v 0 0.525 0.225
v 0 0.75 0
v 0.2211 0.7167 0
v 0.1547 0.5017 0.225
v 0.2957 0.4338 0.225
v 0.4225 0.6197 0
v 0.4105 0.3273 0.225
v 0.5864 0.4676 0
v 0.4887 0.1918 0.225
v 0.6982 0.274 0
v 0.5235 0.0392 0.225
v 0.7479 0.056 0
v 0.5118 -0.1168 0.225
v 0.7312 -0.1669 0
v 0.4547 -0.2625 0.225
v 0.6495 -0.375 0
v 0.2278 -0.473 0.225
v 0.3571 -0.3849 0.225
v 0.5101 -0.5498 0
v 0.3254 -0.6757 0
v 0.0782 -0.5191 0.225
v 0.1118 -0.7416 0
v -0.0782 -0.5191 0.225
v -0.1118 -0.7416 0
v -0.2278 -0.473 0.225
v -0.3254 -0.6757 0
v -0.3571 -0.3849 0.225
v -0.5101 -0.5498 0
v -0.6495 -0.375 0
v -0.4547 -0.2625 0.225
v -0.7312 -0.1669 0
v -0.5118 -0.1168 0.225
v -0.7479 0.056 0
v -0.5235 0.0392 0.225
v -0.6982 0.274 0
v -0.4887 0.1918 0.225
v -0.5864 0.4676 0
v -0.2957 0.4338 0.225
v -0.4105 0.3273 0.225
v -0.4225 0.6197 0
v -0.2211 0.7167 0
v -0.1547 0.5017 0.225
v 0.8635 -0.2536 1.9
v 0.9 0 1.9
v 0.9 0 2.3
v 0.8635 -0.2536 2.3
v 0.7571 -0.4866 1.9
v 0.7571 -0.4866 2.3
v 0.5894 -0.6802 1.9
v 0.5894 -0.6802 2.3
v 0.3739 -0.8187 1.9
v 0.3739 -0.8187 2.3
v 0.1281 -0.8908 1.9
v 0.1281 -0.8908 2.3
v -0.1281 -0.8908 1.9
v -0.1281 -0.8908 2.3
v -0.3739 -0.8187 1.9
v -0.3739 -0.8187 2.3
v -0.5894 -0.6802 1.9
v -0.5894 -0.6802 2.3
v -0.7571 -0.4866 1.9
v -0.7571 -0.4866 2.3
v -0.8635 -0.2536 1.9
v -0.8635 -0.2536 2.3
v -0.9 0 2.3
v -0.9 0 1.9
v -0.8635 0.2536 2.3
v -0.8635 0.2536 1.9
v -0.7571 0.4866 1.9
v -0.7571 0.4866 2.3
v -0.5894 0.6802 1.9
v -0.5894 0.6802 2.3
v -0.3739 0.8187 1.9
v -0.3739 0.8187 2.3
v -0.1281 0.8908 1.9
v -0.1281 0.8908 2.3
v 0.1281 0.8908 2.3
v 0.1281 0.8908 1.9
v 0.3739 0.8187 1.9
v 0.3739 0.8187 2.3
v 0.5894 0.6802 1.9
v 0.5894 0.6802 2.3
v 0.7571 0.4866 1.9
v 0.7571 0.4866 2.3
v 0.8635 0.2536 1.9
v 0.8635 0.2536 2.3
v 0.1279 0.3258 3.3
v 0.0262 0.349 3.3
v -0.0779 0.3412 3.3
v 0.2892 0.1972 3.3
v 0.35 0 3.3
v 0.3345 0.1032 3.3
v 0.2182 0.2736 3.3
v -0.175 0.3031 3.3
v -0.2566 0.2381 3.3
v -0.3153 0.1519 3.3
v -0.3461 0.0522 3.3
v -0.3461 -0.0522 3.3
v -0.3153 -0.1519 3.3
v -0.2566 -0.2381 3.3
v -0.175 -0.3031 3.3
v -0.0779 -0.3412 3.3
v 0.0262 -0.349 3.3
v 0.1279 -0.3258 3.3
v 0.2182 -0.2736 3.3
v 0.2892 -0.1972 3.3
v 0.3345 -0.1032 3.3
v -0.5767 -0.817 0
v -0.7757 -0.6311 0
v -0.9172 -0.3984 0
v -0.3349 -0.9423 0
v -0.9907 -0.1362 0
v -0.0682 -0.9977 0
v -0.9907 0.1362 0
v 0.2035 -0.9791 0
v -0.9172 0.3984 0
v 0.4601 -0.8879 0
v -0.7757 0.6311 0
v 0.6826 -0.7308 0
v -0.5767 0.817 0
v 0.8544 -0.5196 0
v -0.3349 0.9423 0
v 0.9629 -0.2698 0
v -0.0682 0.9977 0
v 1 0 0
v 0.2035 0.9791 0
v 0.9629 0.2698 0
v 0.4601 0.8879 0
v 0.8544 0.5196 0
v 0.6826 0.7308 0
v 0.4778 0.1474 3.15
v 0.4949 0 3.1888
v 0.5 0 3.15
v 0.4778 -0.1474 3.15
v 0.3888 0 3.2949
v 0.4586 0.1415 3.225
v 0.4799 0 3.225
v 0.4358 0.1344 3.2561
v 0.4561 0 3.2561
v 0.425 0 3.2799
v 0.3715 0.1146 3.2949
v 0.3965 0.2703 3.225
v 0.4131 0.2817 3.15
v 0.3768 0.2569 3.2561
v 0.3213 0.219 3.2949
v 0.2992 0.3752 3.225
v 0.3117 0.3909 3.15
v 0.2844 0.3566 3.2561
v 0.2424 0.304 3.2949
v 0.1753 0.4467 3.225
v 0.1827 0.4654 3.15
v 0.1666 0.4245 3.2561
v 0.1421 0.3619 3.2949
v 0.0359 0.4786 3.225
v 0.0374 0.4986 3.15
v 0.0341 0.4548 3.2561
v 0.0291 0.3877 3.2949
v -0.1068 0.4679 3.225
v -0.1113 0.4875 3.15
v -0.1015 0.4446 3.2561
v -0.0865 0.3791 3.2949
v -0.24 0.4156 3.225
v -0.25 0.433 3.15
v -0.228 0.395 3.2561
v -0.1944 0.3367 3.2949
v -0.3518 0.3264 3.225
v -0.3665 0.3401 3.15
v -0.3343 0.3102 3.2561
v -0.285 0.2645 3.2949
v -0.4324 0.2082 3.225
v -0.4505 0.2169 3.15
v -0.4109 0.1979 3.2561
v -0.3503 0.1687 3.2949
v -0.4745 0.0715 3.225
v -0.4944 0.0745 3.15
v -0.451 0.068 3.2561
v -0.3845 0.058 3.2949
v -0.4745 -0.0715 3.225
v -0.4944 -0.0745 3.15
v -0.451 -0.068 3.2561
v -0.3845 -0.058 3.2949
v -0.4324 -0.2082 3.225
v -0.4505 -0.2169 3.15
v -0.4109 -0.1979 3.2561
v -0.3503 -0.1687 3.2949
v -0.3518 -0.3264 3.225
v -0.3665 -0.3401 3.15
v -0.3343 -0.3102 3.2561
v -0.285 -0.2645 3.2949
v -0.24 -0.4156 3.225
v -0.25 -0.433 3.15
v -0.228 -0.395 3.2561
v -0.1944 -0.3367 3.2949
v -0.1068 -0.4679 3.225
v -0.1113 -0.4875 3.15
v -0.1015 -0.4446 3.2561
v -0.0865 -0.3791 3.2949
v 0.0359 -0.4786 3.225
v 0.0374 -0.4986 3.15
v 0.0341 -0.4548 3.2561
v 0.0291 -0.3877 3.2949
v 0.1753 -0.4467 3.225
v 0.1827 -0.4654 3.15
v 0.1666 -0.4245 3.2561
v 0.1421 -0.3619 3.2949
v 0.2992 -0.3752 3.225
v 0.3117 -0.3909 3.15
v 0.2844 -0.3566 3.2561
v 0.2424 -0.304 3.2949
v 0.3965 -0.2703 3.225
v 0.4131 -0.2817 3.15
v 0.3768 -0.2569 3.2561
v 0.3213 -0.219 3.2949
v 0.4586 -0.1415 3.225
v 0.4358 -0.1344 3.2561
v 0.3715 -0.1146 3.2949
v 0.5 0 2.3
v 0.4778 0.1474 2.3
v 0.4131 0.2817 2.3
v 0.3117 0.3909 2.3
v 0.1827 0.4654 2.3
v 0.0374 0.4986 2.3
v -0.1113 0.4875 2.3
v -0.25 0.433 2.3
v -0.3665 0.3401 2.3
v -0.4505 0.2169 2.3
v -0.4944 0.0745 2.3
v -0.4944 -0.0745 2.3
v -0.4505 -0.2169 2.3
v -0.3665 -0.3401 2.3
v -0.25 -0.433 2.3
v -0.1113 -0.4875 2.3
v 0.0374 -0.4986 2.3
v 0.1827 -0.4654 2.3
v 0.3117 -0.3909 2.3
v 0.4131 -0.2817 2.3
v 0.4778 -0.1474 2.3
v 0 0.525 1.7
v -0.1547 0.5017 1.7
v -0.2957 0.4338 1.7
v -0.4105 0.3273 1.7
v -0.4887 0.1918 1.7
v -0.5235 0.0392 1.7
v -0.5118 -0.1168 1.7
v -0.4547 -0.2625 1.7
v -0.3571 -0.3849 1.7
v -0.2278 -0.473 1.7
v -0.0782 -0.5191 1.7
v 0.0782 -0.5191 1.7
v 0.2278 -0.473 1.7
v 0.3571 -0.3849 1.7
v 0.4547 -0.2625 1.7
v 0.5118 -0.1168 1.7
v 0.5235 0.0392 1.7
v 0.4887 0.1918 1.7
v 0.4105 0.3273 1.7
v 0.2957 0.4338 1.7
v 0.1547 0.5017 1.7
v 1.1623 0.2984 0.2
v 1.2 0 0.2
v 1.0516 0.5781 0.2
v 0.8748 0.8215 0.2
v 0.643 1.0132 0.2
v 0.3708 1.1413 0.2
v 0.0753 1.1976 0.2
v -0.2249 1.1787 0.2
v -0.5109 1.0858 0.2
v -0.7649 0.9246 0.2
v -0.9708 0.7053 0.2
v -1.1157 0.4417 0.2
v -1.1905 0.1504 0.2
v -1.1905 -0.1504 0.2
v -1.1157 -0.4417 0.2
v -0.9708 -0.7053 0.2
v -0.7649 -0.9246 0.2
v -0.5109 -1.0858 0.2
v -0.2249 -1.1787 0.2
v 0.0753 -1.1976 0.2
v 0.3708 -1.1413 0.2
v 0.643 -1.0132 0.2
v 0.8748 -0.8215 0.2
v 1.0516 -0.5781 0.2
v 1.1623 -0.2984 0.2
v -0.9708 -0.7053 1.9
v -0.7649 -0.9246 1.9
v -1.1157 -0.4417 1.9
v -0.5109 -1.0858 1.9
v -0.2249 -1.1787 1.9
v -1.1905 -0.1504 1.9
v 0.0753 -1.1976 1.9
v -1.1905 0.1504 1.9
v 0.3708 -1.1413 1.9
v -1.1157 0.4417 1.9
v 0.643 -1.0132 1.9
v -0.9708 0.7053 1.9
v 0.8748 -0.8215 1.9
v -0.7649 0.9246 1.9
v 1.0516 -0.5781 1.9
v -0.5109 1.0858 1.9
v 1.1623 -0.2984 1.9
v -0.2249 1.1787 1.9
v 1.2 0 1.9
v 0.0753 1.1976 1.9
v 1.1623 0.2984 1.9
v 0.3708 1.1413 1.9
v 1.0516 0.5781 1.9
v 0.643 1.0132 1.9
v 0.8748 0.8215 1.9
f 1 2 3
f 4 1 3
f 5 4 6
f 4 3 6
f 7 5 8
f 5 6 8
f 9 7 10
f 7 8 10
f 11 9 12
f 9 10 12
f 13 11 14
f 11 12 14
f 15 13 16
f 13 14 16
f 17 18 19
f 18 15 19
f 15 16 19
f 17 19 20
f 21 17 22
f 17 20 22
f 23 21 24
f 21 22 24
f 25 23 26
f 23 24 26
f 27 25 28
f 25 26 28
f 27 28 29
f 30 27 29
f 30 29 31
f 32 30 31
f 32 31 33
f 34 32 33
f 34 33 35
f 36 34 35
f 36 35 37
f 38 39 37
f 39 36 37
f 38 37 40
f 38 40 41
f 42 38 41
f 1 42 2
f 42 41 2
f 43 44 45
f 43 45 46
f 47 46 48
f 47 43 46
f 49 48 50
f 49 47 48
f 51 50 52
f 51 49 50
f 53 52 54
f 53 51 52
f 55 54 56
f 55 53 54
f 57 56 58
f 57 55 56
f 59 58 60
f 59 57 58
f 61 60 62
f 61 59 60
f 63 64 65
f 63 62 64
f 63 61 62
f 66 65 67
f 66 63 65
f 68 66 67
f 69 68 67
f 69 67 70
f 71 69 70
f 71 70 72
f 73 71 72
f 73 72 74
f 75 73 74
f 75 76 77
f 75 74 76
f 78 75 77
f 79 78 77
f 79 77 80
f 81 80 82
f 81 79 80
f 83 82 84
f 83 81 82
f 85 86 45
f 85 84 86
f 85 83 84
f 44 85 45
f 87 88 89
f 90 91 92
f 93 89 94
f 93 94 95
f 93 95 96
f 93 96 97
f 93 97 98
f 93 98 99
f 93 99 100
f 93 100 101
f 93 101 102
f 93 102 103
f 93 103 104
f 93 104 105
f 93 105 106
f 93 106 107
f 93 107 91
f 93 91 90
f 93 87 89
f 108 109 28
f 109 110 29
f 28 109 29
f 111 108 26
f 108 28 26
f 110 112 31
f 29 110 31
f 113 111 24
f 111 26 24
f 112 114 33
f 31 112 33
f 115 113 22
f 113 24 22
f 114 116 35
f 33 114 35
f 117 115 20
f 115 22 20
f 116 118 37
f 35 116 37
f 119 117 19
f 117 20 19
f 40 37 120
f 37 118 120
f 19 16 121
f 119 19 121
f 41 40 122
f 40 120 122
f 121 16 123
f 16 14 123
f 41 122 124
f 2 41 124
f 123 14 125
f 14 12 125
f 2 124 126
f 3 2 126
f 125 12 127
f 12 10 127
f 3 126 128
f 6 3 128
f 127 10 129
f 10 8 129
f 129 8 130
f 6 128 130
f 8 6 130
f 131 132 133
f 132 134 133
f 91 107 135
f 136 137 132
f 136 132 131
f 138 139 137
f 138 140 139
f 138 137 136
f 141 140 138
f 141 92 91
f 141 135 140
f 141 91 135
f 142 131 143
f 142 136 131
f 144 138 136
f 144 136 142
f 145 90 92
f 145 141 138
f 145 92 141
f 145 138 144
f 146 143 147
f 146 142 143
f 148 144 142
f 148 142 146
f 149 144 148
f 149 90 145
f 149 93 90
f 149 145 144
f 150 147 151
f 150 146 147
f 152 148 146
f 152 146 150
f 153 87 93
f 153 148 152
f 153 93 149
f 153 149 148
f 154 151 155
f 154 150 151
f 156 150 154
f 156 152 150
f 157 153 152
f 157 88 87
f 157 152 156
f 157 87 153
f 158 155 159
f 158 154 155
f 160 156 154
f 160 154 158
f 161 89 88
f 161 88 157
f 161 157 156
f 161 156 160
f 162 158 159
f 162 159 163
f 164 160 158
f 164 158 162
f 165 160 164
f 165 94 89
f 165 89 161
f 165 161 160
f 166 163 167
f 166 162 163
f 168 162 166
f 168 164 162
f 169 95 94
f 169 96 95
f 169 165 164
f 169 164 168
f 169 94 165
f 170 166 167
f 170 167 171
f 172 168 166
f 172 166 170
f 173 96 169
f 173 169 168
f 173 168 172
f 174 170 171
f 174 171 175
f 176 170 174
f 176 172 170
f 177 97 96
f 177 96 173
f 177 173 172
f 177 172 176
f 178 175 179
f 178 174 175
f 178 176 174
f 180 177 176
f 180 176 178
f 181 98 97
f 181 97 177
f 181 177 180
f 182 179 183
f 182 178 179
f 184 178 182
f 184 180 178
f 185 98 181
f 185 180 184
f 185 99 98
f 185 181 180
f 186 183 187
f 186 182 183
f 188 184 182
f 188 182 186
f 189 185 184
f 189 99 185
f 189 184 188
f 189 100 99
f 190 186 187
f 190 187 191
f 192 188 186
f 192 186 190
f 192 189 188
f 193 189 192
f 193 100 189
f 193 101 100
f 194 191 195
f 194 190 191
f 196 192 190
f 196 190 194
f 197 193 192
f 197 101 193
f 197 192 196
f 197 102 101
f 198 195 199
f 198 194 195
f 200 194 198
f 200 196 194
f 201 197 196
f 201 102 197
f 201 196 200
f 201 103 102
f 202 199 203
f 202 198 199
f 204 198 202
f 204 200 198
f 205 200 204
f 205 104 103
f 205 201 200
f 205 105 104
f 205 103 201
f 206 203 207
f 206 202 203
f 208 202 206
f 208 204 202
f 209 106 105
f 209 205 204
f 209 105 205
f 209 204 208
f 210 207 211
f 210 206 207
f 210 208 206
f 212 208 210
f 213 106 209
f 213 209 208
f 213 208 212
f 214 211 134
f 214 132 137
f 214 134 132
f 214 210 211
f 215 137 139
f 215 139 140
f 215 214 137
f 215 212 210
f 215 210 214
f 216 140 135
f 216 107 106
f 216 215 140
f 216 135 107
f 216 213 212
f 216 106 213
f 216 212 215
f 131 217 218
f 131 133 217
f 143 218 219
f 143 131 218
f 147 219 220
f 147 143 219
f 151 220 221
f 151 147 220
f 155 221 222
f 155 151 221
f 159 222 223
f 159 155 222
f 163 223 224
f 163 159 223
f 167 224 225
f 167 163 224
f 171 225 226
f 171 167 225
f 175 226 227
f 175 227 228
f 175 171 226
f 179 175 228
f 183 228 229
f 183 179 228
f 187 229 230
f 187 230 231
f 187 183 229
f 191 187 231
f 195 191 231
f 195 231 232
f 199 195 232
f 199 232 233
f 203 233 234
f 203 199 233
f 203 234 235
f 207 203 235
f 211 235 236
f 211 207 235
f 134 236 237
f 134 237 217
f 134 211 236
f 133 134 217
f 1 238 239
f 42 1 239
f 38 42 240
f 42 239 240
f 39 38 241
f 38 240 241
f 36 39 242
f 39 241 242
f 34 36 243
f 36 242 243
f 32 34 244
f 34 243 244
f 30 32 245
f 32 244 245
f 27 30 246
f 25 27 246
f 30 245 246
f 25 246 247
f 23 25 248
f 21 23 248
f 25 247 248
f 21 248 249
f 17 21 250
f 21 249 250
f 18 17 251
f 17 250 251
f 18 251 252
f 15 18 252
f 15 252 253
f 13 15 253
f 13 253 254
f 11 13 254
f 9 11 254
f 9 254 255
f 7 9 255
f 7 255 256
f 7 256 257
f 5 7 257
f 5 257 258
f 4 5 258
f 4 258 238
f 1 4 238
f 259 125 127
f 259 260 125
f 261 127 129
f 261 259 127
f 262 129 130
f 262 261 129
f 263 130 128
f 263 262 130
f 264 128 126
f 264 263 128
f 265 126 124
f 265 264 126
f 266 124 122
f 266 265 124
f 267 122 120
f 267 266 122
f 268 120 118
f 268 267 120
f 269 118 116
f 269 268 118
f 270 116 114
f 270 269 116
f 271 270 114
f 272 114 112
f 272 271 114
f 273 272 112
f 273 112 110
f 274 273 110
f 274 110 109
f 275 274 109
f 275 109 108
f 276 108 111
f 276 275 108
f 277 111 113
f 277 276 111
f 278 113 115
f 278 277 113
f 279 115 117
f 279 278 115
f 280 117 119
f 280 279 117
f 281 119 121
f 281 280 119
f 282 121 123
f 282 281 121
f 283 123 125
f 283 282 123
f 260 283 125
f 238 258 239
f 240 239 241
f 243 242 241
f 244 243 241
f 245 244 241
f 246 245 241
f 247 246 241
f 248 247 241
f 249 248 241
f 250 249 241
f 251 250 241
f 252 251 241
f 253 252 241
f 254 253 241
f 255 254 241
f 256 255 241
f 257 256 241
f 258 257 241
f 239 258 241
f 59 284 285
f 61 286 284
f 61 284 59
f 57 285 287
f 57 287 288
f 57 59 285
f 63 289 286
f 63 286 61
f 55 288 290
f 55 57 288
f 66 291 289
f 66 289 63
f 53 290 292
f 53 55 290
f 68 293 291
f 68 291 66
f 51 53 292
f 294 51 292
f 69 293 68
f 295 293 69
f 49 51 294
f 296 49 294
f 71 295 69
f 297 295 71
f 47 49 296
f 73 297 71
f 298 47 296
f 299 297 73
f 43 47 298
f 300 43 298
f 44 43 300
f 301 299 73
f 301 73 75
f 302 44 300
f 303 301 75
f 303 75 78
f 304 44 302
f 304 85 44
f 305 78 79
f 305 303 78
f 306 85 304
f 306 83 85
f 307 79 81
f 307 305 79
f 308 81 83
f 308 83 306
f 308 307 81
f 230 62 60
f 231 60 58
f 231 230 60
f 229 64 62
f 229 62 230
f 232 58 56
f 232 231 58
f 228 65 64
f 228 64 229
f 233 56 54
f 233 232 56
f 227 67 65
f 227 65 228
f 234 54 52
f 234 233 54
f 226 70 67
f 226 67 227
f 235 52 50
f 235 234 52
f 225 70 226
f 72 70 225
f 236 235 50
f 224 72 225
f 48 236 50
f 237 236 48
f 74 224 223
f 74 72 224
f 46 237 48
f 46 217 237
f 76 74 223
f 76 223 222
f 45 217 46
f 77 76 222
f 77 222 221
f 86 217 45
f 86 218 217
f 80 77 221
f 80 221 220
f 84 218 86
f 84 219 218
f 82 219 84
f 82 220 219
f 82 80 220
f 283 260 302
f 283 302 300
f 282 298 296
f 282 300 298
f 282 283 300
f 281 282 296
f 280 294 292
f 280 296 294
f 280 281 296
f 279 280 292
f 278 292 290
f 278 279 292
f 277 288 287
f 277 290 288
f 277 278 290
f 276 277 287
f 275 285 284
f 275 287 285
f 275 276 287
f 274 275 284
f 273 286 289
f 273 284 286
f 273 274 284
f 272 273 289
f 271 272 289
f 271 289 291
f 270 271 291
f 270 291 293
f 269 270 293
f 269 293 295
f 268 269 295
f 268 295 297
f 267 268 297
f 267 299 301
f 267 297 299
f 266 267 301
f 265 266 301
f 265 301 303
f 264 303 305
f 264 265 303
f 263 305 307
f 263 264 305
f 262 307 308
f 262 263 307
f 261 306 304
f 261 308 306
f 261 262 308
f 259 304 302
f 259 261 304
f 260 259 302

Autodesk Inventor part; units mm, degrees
ref_plane "YZ Plane" through (0, 0, 0) normal (1, 0, 0) x (0, 1, 0)
ref_plane "XZ Plane" through (0, 0, 0) normal (0, 1, 0) x (-1, 0, 0)
ref_plane "XY Plane" through (0, 0, 0) normal (0, 0, 1) x (1, 0, 0)
sketch "Sketch1" plane through (0, 0, 0) normal (0, 0, 1) x (1, 0, 0)
  circle A0 centre (0, 0) radius 1.2
  dimension "d0" = 2.4
extrude "Extrusion1" add sketch "Sketch1" along normal blind 3.3
sketch "Sketch2" plane through (0, 0, 0) normal (0, 0, -1) x (-1, 0, 0)
  circle A0 centre (0, 0) radius 1.2 projected
  circle A1 centre (0, 0) radius 0.515
  dimension "d3" = 1.03
sketch "Sketch4" plane through (0, 0, 3.3) normal (0, 0, 1) x (1, 0, 0)
  circle A0 centre (0, 0) radius 1.2 projected
  circle A1 centre (0, 0) radius 0.5
  circle A2 centre (0, 0) radius 1
  circle A3 centre (0, 0) radius 1.3
  dimension "d9" = 1
  dimension "d10" = 2
  dimension "d11" = 2.6
extrude "Extrusion4" cut sketch "Sketch4" against normal blind 1.4 contours A0 | A2
sketch "Sketch5" plane through (0, 0, 1.9) normal (0, 0, 1) x (1, 0, 0)
  circle A0 centre (0, 0) radius 0.5 projected
  circle A1 centre (0, 0) radius 0.5 projected
  circle A2 centre (0, 0) radius 0.5 projected
  circle A3 centre (0, 0) radius 1.2 projected
  circle A4 centre (0, 0) radius 0.65
  circle A5 centre (0, 0) radius 0.3
  dimension "d14" = 1
  dimension "d15" = 1.3
extrude "Extrusion5" [suppressed]
hole "Hole1" at (0, 0, 0) direction (0, 0, 1) diameter 1.05 depth 1.7 countersink diameter 1.5 countersink angle 90
sketch "Sketch6" plane through (0, 0, 1.9) normal (0, 0, 1) x (1, 0, 0)
  circle A0 centre (0, 0) radius 0.5 projected
  circle A1 centre (0, 0) radius 1.2 projected
  circle A2 centre (0, 0) radius 0.9
  dimension "d25" = 1.8
extrude "Extrusion6" add sketch "Sketch6" along normal blind 0.4 contours A2
fillet "Fillet1" radius 0.15 1 edges at (-0.5, 0, 3.3)
fillet "Fillet2" [suppressed]
chamfer "Chamfer1" distance 0.2 angle 45 1 edges at (-1.2, 0, 0)
properties part number "MU_Motor_Coupling_3" material "Aluminum-6061-AHC"
